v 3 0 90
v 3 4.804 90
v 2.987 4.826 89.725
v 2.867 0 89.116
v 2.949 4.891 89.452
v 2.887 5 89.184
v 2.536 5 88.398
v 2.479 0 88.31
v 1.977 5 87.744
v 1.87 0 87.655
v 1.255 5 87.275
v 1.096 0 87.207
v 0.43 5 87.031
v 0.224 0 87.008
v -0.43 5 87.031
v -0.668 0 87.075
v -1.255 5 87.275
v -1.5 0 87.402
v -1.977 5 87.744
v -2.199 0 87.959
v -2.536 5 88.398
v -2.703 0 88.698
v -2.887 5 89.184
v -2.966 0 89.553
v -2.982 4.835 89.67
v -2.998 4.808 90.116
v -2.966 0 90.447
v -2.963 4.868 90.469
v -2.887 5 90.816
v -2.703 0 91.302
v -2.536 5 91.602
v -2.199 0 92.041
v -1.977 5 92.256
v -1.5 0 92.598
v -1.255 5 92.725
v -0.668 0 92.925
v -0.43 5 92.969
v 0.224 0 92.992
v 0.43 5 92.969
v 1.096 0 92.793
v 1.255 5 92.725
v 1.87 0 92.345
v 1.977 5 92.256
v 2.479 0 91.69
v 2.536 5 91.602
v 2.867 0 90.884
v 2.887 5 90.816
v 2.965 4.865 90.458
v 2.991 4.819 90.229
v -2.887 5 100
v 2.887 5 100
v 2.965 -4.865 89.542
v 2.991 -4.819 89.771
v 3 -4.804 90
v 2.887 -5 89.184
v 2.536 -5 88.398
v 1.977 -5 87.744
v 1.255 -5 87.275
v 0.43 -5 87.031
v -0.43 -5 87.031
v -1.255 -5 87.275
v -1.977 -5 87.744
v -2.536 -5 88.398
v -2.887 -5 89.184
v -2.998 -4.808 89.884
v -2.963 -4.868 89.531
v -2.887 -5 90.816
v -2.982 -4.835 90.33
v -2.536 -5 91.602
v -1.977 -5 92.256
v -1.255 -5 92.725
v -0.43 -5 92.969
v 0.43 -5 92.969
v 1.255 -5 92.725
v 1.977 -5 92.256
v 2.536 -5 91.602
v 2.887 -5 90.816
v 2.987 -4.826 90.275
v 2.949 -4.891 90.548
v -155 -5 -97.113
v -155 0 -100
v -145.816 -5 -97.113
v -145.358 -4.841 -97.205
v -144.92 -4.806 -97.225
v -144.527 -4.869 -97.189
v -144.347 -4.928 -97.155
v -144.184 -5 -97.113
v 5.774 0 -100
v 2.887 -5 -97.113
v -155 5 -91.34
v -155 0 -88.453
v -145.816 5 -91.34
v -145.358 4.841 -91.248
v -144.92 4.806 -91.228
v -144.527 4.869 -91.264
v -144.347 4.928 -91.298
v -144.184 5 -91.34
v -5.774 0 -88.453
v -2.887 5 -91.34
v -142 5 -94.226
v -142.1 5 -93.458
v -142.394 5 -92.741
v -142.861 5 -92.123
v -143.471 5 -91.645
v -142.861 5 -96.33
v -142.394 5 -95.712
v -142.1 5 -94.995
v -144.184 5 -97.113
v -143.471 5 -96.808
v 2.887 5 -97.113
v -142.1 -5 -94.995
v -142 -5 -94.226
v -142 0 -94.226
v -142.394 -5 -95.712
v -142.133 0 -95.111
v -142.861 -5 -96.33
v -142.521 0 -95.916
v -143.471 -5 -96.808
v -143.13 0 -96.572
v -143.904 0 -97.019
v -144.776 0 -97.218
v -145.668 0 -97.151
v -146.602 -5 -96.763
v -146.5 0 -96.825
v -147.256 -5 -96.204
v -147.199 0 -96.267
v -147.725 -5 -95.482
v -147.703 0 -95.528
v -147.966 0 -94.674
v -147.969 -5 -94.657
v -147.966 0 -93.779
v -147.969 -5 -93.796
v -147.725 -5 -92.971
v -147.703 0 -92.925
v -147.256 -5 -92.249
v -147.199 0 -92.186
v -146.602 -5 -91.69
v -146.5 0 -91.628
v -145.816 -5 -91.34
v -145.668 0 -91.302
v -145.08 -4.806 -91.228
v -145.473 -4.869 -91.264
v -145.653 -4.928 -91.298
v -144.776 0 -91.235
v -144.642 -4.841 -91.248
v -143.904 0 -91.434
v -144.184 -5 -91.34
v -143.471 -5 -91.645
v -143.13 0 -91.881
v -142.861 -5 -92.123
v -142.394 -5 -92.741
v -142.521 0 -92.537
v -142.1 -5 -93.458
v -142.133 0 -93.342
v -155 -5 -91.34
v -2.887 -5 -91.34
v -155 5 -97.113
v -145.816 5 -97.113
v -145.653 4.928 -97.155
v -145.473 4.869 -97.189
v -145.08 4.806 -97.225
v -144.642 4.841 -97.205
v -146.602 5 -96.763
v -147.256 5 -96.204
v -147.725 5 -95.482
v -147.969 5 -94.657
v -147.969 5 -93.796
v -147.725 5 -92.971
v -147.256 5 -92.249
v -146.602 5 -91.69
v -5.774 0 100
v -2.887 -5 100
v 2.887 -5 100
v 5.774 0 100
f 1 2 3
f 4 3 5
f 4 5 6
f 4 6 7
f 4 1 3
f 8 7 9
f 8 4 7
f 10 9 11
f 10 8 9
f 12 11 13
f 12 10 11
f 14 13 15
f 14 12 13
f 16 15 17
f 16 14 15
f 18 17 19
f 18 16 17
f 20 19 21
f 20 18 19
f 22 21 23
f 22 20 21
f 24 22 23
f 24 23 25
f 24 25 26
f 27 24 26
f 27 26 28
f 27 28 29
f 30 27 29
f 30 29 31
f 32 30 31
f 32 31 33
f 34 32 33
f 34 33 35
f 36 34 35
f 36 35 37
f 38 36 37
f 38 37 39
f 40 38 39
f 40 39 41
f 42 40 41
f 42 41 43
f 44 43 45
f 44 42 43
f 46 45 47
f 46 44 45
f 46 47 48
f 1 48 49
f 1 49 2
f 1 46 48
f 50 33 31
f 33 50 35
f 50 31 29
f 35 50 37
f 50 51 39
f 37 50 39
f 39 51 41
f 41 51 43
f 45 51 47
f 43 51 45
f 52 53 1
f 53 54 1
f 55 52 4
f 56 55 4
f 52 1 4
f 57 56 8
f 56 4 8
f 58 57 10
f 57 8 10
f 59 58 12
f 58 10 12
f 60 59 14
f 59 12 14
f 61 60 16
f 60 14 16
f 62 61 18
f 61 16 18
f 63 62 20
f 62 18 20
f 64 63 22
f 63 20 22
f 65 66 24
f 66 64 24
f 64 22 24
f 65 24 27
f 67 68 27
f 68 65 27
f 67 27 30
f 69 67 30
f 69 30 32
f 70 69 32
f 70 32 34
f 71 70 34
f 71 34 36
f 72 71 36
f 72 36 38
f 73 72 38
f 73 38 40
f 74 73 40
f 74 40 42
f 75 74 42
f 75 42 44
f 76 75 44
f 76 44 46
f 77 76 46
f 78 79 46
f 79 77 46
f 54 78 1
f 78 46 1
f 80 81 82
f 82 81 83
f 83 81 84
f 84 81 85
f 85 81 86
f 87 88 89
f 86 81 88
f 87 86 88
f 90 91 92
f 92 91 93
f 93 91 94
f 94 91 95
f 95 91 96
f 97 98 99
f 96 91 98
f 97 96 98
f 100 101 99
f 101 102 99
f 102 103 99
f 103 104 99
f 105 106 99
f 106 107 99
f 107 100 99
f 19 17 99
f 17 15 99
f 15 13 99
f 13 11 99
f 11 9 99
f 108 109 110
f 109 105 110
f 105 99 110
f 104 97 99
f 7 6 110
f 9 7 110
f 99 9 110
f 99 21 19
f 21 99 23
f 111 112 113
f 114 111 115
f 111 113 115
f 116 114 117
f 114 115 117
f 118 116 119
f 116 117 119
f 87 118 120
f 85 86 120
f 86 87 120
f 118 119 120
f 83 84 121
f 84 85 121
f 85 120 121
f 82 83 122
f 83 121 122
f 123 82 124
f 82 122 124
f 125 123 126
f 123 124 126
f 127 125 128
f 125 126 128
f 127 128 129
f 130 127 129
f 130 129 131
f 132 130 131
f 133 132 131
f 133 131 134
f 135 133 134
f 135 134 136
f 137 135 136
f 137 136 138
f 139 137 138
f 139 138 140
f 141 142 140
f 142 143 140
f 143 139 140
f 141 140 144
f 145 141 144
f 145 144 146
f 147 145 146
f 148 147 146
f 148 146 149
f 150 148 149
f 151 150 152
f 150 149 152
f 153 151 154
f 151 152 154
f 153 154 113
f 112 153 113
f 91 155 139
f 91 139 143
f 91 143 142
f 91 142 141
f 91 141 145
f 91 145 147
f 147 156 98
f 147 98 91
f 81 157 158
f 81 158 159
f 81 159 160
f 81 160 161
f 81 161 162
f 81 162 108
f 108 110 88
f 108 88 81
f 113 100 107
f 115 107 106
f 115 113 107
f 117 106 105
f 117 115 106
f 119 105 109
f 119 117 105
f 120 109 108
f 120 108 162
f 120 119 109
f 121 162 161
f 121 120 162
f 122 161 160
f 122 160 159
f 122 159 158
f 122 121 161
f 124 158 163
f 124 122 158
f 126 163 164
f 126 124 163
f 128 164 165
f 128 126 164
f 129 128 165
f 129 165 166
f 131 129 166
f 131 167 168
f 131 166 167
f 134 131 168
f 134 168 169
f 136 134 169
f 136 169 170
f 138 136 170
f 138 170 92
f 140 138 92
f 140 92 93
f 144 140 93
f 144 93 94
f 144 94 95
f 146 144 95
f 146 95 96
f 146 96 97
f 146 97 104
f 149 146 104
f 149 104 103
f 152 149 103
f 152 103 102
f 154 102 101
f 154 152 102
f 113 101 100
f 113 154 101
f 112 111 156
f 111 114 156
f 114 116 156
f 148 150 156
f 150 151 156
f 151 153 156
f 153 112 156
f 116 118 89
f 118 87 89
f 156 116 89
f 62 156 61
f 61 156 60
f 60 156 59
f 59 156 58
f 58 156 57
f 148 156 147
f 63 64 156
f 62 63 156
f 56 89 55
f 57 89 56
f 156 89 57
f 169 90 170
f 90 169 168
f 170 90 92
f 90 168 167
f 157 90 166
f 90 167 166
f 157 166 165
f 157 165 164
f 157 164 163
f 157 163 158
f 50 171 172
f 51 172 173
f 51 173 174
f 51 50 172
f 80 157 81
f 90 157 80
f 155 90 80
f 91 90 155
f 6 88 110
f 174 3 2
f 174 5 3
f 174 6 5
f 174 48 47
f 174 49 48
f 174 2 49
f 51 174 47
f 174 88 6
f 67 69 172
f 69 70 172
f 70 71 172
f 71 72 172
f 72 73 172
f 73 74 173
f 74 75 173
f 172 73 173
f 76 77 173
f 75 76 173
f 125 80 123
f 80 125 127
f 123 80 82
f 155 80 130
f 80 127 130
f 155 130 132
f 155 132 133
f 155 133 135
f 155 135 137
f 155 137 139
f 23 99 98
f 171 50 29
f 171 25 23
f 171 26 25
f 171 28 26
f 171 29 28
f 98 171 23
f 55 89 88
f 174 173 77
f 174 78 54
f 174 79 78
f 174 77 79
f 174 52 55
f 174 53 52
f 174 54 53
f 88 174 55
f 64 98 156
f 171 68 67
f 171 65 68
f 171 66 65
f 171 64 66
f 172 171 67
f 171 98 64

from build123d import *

# Parameters (mm, degrees)
BOSS_EXTRUDE1_DEPTH     = 100
CUT_EXTRUDE1_DEPTH      = 6
CUT_EXTRUDE1_DEPTH_BACK = 6
SKETCH5_R               = 3
CUT_EXTRUDE2_DEPTH      = 6.0000001
CUT_EXTRUDE2_DEPTH_BACK = 6.0000001


with BuildPart() as part:
    # Sketch1 → Boss-Extrude1 (new body, symmetric)
    with BuildSketch(Plane.XY):
        Polygon((-5.773502692, 0), (-2.886751346, -5), (2.886751346, -5), (5.773502692, 0), (2.886751346, 5), (-2.886751346, 5), align=None)
    extrude(amount=BOSS_EXTRUDE1_DEPTH, both=True)

    # Sketch2 → Cut-Extrude1 (cut, two sides)
    with BuildSketch(Plane(origin=(0, 0, 0), x_dir=(1, 0, 0), z_dir=(0, 1, 0))) as cut_extrude1_sk:
        Polygon((5.773502692, 100), (-5.773502692, 88.452994616), (-5.773502692, 100), align=None)
    extrude(amount=CUT_EXTRUDE1_DEPTH, mode=Mode.SUBTRACT)
    extrude(cut_extrude1_sk.sketch, amount=-CUT_EXTRUDE1_DEPTH_BACK, mode=Mode.SUBTRACT)

    # Sketch4 → section 0 of loft1
    with BuildSketch(Plane.ZY.offset(155), mode=Mode.PRIVATE) as loft1_s0:
        Polygon((-97.113248654, 5), (-100, 0), (-97.113248654, -5), (-91.339745962, -5), (-88.452994616, 0), (-91.339745962, 5), align=None)
    # loft up to a face of the part (loft1)
    loft([loft1_s0.sketch, part.faces().sort_by_distance((0, 0, -94.226497308))[0]])

    # Sketch5 → Cut-Extrude2 (cut, two sides)
    with BuildSketch(Plane(origin=(0, 0, 0), x_dir=(1, 0, 0), z_dir=(0, 1, 0))) as cut_extrude2_sk:
        with Locations((0, -90)):
            Circle(SKETCH5_R)
        with Locations((-145, 94.226497308)):
            Circle(SKETCH5_R)
    extrude(amount=CUT_EXTRUDE2_DEPTH, mode=Mode.SUBTRACT)
    extrude(cut_extrude2_sk.sketch, amount=-CUT_EXTRUDE2_DEPTH_BACK, mode=Mode.SUBTRACT)


solid = part.part
